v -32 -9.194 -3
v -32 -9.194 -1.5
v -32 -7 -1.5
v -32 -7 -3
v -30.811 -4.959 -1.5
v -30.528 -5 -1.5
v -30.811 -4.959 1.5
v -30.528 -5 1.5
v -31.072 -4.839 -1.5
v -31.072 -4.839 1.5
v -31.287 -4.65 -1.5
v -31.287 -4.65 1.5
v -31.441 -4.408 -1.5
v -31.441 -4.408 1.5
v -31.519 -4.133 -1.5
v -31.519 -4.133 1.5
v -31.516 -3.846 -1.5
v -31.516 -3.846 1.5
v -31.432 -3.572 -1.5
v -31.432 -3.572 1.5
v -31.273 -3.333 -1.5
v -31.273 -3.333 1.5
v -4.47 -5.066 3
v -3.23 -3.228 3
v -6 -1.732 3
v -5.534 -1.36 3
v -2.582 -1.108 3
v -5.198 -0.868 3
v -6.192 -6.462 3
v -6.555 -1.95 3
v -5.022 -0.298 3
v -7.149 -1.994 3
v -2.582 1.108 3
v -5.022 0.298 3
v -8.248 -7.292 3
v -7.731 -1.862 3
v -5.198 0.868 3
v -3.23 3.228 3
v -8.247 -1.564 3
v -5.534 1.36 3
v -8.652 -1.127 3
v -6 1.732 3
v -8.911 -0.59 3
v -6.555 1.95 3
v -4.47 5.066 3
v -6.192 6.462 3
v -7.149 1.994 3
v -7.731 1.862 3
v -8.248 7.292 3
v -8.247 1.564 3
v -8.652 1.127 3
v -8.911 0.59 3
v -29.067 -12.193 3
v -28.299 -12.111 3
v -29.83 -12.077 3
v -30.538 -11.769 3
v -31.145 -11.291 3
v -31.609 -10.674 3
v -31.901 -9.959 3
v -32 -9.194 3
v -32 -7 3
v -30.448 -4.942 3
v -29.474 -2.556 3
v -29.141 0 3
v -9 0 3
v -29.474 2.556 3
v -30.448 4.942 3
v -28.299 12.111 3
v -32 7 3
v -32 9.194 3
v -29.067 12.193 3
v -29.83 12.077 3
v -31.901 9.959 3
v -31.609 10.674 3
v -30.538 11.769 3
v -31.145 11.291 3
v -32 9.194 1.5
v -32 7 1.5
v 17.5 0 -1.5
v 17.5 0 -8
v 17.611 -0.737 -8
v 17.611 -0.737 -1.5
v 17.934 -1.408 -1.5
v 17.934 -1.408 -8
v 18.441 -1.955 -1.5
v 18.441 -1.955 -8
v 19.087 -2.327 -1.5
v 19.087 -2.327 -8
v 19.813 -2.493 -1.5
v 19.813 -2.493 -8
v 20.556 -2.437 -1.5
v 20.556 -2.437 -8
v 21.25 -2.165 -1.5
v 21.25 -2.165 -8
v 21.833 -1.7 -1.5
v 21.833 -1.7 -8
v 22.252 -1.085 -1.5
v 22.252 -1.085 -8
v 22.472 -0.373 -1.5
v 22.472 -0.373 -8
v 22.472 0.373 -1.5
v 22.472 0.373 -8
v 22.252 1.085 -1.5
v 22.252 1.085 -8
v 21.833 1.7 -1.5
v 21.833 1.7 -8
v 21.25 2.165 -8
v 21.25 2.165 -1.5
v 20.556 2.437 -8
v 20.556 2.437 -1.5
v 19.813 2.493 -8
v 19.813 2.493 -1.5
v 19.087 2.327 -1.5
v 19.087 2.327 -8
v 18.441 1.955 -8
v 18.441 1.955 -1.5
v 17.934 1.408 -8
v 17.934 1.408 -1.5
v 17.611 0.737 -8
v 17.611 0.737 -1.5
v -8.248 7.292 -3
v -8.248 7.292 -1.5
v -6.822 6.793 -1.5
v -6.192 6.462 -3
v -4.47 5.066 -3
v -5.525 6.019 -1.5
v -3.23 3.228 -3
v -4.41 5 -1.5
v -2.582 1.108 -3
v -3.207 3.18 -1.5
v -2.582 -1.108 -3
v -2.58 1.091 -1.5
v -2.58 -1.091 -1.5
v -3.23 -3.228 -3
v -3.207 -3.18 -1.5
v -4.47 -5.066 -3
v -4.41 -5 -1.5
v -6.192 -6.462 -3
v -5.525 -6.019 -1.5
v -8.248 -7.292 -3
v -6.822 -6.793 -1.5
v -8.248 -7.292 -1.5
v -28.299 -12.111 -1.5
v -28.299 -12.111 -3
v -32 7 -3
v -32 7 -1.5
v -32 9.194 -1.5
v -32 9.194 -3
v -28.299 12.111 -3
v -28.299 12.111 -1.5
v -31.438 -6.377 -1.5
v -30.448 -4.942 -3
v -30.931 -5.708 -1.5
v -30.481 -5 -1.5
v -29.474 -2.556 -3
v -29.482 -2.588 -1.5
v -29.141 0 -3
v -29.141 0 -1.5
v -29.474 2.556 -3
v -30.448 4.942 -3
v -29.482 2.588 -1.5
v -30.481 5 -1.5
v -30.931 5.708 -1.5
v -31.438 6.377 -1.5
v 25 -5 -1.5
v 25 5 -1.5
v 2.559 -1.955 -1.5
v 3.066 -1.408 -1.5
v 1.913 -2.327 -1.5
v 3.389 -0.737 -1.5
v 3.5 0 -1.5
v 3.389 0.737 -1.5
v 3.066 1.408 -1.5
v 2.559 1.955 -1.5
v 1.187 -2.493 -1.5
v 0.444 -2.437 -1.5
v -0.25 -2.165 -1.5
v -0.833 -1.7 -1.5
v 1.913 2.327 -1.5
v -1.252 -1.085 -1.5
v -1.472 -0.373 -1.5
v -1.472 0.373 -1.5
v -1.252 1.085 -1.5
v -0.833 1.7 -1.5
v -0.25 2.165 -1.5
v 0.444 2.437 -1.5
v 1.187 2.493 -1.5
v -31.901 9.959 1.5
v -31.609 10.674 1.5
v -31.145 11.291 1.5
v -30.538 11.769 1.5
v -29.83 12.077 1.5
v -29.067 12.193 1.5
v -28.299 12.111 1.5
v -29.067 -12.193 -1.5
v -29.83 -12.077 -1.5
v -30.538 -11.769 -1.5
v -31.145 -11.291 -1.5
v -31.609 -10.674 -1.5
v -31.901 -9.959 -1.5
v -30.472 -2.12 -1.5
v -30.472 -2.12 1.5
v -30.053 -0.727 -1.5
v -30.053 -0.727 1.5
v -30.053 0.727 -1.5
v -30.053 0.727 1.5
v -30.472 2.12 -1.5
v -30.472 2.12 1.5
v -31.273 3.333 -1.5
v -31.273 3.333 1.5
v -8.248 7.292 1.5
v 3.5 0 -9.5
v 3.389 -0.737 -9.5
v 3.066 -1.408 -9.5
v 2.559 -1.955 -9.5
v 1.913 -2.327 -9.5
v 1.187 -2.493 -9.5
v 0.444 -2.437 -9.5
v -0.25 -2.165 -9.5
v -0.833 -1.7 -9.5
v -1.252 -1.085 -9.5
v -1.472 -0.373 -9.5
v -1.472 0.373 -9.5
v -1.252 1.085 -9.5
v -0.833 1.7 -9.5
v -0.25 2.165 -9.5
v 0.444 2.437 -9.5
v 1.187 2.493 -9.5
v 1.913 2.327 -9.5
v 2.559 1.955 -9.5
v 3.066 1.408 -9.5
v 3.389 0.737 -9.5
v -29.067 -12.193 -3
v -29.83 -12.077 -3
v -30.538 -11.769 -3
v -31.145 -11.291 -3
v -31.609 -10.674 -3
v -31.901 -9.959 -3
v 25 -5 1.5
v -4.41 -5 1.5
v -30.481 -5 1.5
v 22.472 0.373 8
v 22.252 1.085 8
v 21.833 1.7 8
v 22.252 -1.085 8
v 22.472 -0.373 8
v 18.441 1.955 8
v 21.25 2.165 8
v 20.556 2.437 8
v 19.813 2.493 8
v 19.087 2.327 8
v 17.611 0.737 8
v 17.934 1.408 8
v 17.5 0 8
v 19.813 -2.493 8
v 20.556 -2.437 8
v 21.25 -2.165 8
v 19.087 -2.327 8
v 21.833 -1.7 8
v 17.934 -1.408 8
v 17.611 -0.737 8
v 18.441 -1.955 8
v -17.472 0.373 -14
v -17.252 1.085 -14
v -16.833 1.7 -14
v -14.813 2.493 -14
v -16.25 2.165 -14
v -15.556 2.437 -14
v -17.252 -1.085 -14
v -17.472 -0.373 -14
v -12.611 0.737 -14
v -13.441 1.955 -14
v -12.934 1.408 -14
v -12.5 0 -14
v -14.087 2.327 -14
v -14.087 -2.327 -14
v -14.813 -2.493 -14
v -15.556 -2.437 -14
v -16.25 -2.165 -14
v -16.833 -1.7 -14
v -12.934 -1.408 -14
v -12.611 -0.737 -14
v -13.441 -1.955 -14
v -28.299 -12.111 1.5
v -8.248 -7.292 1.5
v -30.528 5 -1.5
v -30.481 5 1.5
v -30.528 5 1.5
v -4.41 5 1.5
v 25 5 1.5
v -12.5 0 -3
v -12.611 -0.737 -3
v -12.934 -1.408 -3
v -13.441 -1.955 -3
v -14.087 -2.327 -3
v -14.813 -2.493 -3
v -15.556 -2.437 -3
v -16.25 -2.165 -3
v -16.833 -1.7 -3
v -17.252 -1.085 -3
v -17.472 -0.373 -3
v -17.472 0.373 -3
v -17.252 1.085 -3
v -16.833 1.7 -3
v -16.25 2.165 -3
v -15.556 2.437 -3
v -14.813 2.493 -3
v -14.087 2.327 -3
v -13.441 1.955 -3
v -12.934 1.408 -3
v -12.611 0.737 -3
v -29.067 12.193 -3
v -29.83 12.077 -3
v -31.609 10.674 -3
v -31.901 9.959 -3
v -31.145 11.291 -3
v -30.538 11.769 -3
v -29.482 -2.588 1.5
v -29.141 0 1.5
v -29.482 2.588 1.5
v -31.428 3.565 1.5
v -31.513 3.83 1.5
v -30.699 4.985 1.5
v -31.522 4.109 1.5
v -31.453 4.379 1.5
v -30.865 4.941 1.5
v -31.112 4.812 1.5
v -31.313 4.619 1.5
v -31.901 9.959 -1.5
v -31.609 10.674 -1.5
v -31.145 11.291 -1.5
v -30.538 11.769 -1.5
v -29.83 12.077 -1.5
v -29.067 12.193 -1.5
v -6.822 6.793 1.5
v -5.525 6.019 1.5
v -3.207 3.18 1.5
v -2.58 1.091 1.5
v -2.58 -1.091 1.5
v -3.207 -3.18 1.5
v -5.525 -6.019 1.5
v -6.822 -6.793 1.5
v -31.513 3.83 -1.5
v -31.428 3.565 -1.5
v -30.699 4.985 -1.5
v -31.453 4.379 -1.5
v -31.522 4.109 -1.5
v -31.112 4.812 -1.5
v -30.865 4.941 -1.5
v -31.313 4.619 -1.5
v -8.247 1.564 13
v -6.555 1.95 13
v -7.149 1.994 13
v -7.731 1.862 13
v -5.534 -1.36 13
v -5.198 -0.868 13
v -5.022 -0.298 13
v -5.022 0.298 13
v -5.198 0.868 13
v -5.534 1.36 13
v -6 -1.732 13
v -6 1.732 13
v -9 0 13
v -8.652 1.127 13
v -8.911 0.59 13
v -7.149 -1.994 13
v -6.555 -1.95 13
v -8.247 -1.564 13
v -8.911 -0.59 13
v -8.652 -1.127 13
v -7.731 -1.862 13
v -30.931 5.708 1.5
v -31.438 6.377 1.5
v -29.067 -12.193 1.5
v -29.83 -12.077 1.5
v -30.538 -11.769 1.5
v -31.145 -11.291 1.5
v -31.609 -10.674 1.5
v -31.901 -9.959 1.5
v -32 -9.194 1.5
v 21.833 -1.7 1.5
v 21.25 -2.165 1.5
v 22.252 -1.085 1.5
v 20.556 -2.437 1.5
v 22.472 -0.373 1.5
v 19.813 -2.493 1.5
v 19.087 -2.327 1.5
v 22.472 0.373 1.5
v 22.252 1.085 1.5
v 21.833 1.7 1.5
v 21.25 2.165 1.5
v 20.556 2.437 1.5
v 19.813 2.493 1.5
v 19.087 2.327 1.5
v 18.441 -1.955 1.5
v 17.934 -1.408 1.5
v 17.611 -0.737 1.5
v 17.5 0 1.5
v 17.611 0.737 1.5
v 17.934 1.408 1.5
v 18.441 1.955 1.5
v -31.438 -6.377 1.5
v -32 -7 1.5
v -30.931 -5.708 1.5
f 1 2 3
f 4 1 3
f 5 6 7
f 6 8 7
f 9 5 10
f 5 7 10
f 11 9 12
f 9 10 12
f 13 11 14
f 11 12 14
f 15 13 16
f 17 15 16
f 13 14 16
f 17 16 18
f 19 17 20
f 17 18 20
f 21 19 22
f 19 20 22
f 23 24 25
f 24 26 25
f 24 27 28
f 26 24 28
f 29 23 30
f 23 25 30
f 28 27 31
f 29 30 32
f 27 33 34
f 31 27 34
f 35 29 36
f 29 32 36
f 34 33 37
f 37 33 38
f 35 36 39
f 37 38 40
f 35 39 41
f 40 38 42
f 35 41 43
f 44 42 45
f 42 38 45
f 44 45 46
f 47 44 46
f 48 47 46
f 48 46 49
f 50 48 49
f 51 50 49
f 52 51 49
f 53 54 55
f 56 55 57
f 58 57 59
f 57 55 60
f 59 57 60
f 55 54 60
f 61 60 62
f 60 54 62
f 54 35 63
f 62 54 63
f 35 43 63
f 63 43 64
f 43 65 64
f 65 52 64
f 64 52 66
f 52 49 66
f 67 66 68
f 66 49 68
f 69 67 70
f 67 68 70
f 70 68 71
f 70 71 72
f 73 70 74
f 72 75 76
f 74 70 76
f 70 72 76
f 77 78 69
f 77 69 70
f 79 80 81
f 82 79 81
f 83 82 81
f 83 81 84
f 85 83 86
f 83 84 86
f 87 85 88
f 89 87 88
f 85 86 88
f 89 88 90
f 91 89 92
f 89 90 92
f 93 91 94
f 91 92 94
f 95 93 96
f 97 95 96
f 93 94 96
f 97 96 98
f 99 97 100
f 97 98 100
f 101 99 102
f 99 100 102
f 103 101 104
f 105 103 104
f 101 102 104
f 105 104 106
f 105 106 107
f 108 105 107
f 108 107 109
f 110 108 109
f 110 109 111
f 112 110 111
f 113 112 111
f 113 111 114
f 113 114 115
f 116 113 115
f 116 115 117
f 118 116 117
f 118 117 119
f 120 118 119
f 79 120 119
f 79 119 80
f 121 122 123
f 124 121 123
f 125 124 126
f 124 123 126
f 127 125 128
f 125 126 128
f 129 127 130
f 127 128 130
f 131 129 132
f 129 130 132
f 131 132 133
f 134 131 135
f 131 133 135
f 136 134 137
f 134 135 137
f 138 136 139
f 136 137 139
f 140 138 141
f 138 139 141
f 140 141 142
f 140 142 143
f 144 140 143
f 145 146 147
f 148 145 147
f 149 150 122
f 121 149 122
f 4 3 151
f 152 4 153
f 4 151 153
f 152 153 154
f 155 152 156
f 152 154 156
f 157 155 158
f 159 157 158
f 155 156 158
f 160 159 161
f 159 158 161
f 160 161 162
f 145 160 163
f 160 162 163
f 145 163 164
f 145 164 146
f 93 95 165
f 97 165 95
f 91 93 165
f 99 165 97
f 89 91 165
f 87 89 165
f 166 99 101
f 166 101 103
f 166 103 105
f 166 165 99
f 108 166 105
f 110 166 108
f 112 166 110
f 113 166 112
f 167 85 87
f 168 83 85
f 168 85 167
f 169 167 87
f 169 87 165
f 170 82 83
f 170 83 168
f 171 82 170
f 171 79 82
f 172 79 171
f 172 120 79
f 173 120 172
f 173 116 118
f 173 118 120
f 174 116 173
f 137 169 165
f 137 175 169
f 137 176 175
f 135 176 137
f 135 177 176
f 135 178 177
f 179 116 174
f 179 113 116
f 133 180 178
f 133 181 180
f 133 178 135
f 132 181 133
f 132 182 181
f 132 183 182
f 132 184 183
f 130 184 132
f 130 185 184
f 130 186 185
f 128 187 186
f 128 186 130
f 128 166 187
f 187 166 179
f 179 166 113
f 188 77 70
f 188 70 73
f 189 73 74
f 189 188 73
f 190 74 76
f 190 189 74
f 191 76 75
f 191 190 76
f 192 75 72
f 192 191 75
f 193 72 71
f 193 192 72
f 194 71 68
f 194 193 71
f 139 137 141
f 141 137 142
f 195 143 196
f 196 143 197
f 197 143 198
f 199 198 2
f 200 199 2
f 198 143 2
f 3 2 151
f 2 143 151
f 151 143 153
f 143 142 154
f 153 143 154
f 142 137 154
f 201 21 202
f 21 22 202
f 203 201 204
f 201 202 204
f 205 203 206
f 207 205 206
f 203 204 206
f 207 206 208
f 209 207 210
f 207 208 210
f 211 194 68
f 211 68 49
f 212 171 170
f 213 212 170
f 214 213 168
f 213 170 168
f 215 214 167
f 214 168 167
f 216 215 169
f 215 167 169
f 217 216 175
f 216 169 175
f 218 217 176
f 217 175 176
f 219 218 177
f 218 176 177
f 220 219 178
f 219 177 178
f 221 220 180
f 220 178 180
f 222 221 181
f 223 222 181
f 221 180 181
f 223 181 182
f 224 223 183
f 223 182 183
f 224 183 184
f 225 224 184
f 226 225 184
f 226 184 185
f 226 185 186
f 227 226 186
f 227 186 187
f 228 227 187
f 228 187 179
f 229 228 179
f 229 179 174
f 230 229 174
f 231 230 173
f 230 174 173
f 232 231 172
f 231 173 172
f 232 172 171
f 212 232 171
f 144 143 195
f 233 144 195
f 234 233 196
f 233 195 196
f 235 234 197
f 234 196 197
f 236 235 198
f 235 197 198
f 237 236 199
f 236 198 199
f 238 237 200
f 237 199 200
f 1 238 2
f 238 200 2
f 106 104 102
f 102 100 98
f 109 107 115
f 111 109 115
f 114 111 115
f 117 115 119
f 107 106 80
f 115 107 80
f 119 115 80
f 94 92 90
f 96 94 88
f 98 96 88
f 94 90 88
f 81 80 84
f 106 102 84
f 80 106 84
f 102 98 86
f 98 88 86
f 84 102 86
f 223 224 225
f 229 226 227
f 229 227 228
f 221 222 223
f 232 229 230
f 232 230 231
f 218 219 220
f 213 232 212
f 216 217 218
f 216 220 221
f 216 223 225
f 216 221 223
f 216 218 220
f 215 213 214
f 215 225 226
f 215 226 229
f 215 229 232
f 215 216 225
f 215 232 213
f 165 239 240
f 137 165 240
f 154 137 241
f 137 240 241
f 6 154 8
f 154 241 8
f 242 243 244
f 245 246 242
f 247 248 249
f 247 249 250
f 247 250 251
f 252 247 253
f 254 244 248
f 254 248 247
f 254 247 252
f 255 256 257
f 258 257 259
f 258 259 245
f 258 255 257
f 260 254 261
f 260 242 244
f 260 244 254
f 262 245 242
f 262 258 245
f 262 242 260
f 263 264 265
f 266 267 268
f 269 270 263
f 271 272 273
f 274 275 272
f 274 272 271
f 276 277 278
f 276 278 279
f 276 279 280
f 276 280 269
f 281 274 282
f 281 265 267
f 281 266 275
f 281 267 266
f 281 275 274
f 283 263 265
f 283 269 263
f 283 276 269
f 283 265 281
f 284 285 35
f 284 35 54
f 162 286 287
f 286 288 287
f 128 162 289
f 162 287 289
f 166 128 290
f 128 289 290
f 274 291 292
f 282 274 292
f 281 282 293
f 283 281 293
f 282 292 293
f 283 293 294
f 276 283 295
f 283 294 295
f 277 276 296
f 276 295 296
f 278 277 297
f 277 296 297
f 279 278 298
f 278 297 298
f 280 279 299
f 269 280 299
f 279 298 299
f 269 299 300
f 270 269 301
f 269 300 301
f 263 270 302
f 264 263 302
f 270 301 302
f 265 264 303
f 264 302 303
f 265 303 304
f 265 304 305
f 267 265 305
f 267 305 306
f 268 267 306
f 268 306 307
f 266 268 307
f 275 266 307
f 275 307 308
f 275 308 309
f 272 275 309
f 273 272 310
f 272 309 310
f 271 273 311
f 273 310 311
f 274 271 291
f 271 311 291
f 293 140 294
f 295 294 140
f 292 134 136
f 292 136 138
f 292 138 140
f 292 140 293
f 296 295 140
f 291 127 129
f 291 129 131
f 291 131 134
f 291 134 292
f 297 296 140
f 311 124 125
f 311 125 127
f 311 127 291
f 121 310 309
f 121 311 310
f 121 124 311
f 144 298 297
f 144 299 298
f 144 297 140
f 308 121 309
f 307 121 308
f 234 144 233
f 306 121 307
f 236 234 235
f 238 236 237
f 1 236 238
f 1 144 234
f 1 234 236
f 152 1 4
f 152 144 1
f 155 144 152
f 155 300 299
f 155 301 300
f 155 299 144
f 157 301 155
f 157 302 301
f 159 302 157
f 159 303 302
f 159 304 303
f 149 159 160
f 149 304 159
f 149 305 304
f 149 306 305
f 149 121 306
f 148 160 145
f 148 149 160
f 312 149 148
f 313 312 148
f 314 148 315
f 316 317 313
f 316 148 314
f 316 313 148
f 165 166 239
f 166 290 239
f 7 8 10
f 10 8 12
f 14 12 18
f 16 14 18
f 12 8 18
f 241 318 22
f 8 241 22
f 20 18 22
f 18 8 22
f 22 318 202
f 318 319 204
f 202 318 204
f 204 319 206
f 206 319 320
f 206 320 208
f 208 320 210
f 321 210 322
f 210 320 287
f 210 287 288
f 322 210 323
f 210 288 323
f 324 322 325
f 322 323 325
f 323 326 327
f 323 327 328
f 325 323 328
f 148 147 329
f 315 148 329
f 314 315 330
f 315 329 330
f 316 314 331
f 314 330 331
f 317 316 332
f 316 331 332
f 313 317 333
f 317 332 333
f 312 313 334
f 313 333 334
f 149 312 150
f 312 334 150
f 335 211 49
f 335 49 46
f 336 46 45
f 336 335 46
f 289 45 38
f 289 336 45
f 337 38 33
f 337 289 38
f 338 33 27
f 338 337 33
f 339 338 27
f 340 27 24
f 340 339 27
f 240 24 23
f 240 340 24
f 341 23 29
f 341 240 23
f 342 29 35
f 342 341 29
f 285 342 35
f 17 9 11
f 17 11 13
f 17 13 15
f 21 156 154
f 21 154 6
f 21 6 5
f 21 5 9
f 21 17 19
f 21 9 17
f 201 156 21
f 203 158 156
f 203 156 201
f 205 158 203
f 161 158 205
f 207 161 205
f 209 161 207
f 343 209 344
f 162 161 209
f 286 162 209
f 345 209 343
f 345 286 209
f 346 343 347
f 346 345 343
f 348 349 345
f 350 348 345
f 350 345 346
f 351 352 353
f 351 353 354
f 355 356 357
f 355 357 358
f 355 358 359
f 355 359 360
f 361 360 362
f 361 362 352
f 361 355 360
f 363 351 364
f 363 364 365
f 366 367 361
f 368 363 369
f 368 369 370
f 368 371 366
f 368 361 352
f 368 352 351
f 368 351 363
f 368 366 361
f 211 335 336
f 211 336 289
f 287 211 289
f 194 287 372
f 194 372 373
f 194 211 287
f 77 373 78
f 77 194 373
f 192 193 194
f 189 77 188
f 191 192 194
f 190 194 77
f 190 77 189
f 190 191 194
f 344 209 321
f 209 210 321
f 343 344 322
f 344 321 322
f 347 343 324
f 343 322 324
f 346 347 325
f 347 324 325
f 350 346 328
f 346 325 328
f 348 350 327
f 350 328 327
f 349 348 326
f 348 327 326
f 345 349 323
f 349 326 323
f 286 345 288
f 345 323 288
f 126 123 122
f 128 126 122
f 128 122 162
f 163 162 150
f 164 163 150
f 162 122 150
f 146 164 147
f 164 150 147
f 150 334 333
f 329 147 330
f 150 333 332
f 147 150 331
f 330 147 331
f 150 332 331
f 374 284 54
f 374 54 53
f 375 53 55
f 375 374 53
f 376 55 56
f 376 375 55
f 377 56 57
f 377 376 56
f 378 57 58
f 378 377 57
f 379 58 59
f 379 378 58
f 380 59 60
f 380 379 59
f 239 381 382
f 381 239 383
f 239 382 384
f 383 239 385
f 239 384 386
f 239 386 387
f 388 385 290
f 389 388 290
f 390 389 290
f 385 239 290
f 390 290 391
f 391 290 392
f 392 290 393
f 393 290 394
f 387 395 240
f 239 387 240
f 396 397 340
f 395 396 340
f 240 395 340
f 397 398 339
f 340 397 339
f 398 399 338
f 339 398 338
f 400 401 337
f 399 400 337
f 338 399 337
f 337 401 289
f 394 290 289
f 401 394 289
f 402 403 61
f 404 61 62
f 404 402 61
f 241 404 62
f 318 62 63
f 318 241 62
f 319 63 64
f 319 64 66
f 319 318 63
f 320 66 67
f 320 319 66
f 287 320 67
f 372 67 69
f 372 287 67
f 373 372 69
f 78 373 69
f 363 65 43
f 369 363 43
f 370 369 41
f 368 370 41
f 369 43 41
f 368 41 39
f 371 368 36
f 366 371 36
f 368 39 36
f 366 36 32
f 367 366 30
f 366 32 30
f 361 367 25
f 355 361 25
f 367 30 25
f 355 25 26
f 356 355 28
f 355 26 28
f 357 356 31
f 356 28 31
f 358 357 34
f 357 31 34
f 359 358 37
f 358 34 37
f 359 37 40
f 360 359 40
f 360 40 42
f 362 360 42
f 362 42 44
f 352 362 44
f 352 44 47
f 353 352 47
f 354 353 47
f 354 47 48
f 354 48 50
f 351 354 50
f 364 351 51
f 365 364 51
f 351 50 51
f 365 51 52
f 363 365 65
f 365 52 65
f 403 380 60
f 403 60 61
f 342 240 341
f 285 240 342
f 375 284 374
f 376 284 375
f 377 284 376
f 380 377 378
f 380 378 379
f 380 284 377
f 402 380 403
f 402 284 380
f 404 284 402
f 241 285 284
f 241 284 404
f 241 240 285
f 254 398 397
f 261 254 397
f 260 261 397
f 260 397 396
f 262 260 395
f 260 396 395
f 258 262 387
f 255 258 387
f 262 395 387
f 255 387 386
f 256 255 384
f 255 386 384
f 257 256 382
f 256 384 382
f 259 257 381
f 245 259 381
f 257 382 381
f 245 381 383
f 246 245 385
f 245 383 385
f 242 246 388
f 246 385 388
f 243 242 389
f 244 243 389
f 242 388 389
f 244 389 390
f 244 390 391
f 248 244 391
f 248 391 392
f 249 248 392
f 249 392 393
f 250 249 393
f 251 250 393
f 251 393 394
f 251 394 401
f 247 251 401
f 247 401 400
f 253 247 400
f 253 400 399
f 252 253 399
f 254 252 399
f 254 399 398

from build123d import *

# Parameters (mm, degrees)
BOSS_EXTRUDE2_DEPTH      = 1.5
SKETCH2_R                = 2.5
BOSS_EXTRUDE3_DEPTH      = 1.5
FILLET2_R                = 1
SKETCH3_R                = 2
BOSS_EXTRUDE4_DEPTH      = 10
BOSS_EXTRUDE5_DEPTH      = 5
BOSS_EXTRUDE5_DEPTH_BACK = 11
SKETCH6_R                = 2.5
SKETCH7_R                = 2.5
BOSS_EXTRUDE6_DEPTH      = 11
SKETCH8_R                = 2.5
BOSS_EXTRUDE7_DEPTH      = 8


with BuildPart() as part:
    # Sketch1 → Boss-Extrude2 (new body)
    with BuildSketch(Plane.XY):
        with BuildLine():
            Line((-35, 5), (25, 5))
            Line((25, 5), (25, -5))
            Line((25, -5), (-35, -5))
            ThreePointArc((-35, -5), (-30, 0), (-35, 5))
        make_face()
    boss_extrude2 = extrude(amount=BOSS_EXTRUDE2_DEPTH)

    # Sketch2 → Boss-Extrude3 (add)
    with BuildSketch(Plane.XY.offset(1.5)):
        with Locations(Location((20, 0, 0), (0, 0, 180))):
            Circle(SKETCH2_R)
        with BuildLine():
            Line((-32, -9.19371522), (-32, -7))
            ThreePointArc((-32, -7), (-29.141428429, 0), (-32, 7))
            Line((-32, 7), (-32, 9.19371522))
            ThreePointArc((-32, 9.19371522), (-30.857040195, 11.549856497), (-28.299065524, 12.110681257))
            Line((-28.299065524, 12.110681257), (-8.247663809, 7.292415092))
            ThreePointArc((-8.247663809, 7.292415092), (-2.5, 0), (-8.247663809, -7.292415092))
            Line((-8.247663809, -7.292415092), (-28.299065524, -12.110681257))
            ThreePointArc((-28.299065524, -12.110681257), (-30.857040195, -11.549856497), (-32, -9.19371522))
        make_face()
    boss_extrude3 = extrude(amount=BOSS_EXTRUDE3_DEPTH)

    # Mirror1: Boss-Extrude2, Boss-Extrude3 across plane
    add(boss_extrude2.mirror(Plane(origin=(-35, 0, 0), x_dir=(1, 0, 0), z_dir=(0, 0, -1))))
    add(boss_extrude3.mirror(Plane(origin=(-35, 0, 0), x_dir=(1, 0, 0), z_dir=(0, 0, -1))))

    # Fillet2
    fillet2_edges = [part.edges().sort_by_distance(p)[0] for p in [
        (-35, -5, 0),
        (-35, 5, 0),
    ]]
    fillet(fillet2_edges, radius=FILLET2_R)

    # Sketch3 → Boss-Extrude4 (add)
    with BuildSketch(Plane.XY.offset(3)):
        with Locations(Location((-7, 0, 0), (0, 0, 180))):
            Circle(SKETCH3_R)
    extrude(amount=BOSS_EXTRUDE4_DEPTH)

    # Sketch6 → Boss-Extrude5 (add, two sides: drawn at the far end of the back side and taken through both)
    with BuildSketch(Plane.XY.offset(3).offset(-BOSS_EXTRUDE5_DEPTH_BACK)):
        with Locations(Location((20, 0, 0), (0, 0, 180))):
            Circle(SKETCH6_R)
    extrude(amount=BOSS_EXTRUDE5_DEPTH + BOSS_EXTRUDE5_DEPTH_BACK)

    # Sketch7 → Boss-Extrude6 (add)
    with BuildSketch(Plane(origin=(0, 0, -3), x_dir=(-1, 0, 0), z_dir=(0, 0, -1))):
        with Locations(Location((15, 0, 0), (0, 0, 180))):
            Circle(SKETCH7_R)
    extrude(amount=BOSS_EXTRUDE6_DEPTH)

    # Sketch8 → Boss-Extrude7 (add)
    with BuildSketch(Plane(origin=(0, 0, -1.5), x_dir=(-1, 0, 0), z_dir=(0, 0, -1))):
        with Locations(Location((-1, 0, 0), (0, 0, 180))):
            Circle(SKETCH8_R)
    extrude(amount=BOSS_EXTRUDE7_DEPTH)


solid = part.part
